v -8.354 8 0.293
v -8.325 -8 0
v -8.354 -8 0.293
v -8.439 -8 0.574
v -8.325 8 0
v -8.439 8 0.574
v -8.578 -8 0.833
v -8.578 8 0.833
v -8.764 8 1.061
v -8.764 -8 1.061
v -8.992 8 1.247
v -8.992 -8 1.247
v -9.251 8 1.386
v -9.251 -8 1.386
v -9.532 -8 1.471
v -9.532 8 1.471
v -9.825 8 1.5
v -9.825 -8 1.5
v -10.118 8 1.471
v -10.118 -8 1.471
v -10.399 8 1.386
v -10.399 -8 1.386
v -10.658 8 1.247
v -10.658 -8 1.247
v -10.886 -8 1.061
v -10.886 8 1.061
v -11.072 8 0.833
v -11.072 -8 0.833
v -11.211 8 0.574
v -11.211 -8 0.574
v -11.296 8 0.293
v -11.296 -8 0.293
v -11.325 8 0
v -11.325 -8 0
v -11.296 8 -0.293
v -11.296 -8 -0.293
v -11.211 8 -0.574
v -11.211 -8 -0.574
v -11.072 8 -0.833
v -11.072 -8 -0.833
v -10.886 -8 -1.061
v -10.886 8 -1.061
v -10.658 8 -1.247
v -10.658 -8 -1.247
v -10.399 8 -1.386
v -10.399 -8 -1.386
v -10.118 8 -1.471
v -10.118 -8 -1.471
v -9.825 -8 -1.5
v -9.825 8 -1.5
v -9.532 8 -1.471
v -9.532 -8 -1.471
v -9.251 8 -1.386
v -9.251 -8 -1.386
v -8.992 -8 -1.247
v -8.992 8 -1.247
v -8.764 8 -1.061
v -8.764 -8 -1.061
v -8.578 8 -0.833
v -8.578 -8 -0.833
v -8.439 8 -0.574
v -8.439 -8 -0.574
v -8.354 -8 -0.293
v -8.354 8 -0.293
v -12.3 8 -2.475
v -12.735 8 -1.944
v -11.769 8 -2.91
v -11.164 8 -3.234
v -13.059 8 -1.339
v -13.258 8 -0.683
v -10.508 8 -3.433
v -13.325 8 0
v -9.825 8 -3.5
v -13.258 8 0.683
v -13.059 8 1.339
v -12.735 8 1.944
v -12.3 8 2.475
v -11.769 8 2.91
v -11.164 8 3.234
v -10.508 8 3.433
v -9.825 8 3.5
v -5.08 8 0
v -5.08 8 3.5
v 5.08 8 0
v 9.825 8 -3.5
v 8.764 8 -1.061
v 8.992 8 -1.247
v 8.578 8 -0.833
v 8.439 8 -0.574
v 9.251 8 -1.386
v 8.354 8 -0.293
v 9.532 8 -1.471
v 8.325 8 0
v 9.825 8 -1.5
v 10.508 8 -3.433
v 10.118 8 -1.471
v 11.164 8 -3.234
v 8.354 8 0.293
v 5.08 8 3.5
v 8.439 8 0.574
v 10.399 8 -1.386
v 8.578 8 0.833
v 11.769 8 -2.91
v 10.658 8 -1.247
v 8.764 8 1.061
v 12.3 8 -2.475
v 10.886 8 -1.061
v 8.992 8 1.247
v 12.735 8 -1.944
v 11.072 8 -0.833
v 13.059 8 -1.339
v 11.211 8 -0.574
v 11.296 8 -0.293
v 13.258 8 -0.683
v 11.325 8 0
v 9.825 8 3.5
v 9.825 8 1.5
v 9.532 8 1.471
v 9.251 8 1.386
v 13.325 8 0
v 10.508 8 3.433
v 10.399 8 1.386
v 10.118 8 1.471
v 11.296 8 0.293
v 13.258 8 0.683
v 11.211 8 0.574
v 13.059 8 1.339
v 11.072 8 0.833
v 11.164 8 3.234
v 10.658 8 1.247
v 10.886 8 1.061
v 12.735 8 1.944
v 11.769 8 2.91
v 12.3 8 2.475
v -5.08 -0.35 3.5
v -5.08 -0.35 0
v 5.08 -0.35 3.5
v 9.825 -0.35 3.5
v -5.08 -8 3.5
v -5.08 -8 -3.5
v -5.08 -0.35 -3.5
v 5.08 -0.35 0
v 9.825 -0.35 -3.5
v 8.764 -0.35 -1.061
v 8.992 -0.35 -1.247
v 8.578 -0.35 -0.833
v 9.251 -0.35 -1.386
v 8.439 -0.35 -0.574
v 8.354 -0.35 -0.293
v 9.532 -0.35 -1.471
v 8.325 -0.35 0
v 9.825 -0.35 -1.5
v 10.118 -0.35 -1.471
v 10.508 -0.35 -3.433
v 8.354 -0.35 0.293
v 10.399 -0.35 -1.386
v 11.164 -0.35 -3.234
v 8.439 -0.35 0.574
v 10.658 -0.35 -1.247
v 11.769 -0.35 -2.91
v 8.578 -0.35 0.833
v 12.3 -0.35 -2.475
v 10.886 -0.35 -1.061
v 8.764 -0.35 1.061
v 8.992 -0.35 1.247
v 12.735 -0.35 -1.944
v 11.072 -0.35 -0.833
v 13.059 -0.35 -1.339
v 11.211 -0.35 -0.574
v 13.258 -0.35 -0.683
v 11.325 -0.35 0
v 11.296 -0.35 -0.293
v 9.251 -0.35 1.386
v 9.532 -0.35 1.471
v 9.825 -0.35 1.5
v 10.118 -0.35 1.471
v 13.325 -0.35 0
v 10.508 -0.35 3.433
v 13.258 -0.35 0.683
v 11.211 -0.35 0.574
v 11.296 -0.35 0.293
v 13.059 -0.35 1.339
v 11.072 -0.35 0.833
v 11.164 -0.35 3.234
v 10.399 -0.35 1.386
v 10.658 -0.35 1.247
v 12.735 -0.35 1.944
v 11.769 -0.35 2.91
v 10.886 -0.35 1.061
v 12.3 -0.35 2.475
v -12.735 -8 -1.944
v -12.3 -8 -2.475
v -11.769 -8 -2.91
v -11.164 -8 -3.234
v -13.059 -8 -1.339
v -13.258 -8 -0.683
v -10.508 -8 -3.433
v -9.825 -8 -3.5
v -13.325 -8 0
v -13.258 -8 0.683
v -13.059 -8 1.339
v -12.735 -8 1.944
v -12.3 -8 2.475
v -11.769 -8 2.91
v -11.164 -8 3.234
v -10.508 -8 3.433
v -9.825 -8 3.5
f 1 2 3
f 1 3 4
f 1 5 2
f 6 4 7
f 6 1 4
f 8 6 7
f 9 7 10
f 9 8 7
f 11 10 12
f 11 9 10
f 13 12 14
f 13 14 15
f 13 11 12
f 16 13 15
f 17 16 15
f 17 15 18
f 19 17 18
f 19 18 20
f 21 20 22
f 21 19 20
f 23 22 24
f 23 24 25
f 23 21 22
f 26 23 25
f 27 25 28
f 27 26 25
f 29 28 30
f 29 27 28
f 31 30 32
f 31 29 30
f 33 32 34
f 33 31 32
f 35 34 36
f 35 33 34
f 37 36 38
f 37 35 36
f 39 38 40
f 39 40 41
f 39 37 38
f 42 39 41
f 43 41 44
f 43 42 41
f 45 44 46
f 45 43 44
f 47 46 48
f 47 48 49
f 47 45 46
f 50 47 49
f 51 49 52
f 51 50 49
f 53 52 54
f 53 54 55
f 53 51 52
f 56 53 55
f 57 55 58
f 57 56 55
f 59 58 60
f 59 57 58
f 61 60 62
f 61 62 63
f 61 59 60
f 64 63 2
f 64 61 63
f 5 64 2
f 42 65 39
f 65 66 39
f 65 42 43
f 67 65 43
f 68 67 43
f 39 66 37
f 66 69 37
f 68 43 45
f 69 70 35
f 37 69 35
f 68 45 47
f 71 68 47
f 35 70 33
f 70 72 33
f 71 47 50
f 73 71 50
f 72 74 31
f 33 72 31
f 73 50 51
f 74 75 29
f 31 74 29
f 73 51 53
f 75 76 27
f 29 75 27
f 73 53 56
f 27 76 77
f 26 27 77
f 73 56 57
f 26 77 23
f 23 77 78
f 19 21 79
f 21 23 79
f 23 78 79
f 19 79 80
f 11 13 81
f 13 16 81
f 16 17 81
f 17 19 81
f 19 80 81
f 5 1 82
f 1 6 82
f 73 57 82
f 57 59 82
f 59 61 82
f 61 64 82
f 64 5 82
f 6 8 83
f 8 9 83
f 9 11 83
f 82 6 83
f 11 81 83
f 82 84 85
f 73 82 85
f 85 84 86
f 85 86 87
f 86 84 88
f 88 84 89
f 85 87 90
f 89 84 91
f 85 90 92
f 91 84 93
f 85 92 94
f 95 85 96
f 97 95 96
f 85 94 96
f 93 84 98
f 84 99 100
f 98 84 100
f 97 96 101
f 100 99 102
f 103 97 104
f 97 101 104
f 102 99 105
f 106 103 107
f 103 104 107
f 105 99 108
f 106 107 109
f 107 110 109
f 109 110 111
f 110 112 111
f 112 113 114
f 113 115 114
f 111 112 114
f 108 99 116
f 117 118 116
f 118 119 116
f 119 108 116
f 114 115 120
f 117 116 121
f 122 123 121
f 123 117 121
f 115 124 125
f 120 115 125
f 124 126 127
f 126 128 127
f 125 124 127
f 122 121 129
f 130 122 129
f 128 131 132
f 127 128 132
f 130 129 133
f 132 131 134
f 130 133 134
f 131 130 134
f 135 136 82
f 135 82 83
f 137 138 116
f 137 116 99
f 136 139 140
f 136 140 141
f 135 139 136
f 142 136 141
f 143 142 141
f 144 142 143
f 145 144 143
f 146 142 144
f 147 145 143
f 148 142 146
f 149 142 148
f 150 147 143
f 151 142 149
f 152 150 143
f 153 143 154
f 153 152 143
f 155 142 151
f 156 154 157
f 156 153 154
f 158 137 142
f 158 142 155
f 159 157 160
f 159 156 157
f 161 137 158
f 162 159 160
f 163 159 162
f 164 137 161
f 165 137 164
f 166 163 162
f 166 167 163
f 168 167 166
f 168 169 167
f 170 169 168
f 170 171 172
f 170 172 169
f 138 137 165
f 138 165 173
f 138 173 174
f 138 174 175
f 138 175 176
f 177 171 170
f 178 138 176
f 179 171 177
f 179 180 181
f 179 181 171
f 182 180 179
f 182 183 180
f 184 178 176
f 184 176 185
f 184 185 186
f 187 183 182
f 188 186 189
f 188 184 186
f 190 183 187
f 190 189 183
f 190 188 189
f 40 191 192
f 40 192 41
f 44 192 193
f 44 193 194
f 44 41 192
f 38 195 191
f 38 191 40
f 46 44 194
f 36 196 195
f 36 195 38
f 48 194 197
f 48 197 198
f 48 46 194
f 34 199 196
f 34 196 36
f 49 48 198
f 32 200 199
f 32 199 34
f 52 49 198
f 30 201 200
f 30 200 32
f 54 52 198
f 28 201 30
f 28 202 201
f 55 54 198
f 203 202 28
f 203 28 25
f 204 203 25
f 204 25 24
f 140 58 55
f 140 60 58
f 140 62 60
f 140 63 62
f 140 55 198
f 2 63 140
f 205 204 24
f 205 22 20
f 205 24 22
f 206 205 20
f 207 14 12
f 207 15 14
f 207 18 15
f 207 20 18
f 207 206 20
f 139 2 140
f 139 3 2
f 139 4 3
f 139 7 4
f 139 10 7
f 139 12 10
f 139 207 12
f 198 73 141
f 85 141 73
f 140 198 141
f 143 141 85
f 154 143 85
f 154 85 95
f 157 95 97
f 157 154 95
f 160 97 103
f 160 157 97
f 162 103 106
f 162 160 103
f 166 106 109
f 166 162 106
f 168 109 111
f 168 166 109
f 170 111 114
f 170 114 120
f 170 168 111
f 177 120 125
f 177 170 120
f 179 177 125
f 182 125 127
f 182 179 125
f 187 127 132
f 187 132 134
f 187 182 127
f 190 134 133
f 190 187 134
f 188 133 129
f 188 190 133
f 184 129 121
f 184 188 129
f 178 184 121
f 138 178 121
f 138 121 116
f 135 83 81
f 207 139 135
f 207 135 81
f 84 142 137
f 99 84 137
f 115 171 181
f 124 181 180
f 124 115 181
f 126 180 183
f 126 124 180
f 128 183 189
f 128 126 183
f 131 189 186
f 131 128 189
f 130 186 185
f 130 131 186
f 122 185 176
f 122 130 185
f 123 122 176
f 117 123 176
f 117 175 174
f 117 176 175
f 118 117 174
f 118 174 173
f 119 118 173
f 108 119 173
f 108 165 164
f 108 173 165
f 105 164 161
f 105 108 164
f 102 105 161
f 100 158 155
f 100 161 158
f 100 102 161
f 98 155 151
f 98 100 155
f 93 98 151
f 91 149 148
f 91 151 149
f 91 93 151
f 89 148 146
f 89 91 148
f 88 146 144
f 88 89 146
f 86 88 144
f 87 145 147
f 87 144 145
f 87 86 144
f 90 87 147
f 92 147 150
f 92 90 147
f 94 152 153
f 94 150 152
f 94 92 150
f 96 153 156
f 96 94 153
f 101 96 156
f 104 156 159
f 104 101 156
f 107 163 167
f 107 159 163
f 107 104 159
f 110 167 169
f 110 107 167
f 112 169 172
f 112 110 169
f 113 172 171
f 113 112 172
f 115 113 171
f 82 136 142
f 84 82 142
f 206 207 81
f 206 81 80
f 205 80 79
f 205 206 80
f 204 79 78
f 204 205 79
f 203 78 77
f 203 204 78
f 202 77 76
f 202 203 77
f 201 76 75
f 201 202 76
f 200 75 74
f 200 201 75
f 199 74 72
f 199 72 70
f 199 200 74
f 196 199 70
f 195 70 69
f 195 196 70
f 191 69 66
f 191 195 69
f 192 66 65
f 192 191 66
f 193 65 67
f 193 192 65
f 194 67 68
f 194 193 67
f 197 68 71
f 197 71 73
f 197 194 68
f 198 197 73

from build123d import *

# Parameters (mm, degrees)
F0_R     = 1.5
F1_DEPTH = 8
F2_W     = 30.229195
F2_H     = 14.570514
F3_DEPTH = 25.4
F4_W     = 10.16
F4_H     = 6.534409
F5_DEPTH = 25.4


with BuildPart() as f1:
    # F0 (on Front) → F1 (new body, symmetric)
    with BuildSketch(Plane.XZ):
        with BuildLine():
            Line((9.825, 3.5), (-9.825, 3.5))
            ThreePointArc((-9.825, 3.5), (-13.325, 0), (-9.825, -3.5))
            Line((-9.825, -3.5), (9.825, -3.5))
            ThreePointArc((9.825, -3.5), (13.325, 0), (9.825, 3.5))
        make_face()
        with Locations((-9.825, 0)):
            Circle(F0_R, mode=Mode.SUBTRACT)
        with Locations((9.825, 0)):
            Circle(F0_R, mode=Mode.SUBTRACT)
    extrude(amount=F1_DEPTH, both=True)

    # F2 (on face) → F3 (cut)
    with BuildSketch(Plane.XY.offset(3.5)):
        with Locations((10.034598, -7.635257)):
            Rectangle(F2_W, F2_H)
    extrude(amount=-F3_DEPTH, mode=Mode.SUBTRACT)

    # F4 (on face) → F5 (cut)
    with BuildSketch(Plane.XZ.offset(0.35)):
        with Locations((0, 3.267205)):
            Rectangle(F4_W, F4_H)
    extrude(amount=-F5_DEPTH, mode=Mode.SUBTRACT)


solid = f1.part
